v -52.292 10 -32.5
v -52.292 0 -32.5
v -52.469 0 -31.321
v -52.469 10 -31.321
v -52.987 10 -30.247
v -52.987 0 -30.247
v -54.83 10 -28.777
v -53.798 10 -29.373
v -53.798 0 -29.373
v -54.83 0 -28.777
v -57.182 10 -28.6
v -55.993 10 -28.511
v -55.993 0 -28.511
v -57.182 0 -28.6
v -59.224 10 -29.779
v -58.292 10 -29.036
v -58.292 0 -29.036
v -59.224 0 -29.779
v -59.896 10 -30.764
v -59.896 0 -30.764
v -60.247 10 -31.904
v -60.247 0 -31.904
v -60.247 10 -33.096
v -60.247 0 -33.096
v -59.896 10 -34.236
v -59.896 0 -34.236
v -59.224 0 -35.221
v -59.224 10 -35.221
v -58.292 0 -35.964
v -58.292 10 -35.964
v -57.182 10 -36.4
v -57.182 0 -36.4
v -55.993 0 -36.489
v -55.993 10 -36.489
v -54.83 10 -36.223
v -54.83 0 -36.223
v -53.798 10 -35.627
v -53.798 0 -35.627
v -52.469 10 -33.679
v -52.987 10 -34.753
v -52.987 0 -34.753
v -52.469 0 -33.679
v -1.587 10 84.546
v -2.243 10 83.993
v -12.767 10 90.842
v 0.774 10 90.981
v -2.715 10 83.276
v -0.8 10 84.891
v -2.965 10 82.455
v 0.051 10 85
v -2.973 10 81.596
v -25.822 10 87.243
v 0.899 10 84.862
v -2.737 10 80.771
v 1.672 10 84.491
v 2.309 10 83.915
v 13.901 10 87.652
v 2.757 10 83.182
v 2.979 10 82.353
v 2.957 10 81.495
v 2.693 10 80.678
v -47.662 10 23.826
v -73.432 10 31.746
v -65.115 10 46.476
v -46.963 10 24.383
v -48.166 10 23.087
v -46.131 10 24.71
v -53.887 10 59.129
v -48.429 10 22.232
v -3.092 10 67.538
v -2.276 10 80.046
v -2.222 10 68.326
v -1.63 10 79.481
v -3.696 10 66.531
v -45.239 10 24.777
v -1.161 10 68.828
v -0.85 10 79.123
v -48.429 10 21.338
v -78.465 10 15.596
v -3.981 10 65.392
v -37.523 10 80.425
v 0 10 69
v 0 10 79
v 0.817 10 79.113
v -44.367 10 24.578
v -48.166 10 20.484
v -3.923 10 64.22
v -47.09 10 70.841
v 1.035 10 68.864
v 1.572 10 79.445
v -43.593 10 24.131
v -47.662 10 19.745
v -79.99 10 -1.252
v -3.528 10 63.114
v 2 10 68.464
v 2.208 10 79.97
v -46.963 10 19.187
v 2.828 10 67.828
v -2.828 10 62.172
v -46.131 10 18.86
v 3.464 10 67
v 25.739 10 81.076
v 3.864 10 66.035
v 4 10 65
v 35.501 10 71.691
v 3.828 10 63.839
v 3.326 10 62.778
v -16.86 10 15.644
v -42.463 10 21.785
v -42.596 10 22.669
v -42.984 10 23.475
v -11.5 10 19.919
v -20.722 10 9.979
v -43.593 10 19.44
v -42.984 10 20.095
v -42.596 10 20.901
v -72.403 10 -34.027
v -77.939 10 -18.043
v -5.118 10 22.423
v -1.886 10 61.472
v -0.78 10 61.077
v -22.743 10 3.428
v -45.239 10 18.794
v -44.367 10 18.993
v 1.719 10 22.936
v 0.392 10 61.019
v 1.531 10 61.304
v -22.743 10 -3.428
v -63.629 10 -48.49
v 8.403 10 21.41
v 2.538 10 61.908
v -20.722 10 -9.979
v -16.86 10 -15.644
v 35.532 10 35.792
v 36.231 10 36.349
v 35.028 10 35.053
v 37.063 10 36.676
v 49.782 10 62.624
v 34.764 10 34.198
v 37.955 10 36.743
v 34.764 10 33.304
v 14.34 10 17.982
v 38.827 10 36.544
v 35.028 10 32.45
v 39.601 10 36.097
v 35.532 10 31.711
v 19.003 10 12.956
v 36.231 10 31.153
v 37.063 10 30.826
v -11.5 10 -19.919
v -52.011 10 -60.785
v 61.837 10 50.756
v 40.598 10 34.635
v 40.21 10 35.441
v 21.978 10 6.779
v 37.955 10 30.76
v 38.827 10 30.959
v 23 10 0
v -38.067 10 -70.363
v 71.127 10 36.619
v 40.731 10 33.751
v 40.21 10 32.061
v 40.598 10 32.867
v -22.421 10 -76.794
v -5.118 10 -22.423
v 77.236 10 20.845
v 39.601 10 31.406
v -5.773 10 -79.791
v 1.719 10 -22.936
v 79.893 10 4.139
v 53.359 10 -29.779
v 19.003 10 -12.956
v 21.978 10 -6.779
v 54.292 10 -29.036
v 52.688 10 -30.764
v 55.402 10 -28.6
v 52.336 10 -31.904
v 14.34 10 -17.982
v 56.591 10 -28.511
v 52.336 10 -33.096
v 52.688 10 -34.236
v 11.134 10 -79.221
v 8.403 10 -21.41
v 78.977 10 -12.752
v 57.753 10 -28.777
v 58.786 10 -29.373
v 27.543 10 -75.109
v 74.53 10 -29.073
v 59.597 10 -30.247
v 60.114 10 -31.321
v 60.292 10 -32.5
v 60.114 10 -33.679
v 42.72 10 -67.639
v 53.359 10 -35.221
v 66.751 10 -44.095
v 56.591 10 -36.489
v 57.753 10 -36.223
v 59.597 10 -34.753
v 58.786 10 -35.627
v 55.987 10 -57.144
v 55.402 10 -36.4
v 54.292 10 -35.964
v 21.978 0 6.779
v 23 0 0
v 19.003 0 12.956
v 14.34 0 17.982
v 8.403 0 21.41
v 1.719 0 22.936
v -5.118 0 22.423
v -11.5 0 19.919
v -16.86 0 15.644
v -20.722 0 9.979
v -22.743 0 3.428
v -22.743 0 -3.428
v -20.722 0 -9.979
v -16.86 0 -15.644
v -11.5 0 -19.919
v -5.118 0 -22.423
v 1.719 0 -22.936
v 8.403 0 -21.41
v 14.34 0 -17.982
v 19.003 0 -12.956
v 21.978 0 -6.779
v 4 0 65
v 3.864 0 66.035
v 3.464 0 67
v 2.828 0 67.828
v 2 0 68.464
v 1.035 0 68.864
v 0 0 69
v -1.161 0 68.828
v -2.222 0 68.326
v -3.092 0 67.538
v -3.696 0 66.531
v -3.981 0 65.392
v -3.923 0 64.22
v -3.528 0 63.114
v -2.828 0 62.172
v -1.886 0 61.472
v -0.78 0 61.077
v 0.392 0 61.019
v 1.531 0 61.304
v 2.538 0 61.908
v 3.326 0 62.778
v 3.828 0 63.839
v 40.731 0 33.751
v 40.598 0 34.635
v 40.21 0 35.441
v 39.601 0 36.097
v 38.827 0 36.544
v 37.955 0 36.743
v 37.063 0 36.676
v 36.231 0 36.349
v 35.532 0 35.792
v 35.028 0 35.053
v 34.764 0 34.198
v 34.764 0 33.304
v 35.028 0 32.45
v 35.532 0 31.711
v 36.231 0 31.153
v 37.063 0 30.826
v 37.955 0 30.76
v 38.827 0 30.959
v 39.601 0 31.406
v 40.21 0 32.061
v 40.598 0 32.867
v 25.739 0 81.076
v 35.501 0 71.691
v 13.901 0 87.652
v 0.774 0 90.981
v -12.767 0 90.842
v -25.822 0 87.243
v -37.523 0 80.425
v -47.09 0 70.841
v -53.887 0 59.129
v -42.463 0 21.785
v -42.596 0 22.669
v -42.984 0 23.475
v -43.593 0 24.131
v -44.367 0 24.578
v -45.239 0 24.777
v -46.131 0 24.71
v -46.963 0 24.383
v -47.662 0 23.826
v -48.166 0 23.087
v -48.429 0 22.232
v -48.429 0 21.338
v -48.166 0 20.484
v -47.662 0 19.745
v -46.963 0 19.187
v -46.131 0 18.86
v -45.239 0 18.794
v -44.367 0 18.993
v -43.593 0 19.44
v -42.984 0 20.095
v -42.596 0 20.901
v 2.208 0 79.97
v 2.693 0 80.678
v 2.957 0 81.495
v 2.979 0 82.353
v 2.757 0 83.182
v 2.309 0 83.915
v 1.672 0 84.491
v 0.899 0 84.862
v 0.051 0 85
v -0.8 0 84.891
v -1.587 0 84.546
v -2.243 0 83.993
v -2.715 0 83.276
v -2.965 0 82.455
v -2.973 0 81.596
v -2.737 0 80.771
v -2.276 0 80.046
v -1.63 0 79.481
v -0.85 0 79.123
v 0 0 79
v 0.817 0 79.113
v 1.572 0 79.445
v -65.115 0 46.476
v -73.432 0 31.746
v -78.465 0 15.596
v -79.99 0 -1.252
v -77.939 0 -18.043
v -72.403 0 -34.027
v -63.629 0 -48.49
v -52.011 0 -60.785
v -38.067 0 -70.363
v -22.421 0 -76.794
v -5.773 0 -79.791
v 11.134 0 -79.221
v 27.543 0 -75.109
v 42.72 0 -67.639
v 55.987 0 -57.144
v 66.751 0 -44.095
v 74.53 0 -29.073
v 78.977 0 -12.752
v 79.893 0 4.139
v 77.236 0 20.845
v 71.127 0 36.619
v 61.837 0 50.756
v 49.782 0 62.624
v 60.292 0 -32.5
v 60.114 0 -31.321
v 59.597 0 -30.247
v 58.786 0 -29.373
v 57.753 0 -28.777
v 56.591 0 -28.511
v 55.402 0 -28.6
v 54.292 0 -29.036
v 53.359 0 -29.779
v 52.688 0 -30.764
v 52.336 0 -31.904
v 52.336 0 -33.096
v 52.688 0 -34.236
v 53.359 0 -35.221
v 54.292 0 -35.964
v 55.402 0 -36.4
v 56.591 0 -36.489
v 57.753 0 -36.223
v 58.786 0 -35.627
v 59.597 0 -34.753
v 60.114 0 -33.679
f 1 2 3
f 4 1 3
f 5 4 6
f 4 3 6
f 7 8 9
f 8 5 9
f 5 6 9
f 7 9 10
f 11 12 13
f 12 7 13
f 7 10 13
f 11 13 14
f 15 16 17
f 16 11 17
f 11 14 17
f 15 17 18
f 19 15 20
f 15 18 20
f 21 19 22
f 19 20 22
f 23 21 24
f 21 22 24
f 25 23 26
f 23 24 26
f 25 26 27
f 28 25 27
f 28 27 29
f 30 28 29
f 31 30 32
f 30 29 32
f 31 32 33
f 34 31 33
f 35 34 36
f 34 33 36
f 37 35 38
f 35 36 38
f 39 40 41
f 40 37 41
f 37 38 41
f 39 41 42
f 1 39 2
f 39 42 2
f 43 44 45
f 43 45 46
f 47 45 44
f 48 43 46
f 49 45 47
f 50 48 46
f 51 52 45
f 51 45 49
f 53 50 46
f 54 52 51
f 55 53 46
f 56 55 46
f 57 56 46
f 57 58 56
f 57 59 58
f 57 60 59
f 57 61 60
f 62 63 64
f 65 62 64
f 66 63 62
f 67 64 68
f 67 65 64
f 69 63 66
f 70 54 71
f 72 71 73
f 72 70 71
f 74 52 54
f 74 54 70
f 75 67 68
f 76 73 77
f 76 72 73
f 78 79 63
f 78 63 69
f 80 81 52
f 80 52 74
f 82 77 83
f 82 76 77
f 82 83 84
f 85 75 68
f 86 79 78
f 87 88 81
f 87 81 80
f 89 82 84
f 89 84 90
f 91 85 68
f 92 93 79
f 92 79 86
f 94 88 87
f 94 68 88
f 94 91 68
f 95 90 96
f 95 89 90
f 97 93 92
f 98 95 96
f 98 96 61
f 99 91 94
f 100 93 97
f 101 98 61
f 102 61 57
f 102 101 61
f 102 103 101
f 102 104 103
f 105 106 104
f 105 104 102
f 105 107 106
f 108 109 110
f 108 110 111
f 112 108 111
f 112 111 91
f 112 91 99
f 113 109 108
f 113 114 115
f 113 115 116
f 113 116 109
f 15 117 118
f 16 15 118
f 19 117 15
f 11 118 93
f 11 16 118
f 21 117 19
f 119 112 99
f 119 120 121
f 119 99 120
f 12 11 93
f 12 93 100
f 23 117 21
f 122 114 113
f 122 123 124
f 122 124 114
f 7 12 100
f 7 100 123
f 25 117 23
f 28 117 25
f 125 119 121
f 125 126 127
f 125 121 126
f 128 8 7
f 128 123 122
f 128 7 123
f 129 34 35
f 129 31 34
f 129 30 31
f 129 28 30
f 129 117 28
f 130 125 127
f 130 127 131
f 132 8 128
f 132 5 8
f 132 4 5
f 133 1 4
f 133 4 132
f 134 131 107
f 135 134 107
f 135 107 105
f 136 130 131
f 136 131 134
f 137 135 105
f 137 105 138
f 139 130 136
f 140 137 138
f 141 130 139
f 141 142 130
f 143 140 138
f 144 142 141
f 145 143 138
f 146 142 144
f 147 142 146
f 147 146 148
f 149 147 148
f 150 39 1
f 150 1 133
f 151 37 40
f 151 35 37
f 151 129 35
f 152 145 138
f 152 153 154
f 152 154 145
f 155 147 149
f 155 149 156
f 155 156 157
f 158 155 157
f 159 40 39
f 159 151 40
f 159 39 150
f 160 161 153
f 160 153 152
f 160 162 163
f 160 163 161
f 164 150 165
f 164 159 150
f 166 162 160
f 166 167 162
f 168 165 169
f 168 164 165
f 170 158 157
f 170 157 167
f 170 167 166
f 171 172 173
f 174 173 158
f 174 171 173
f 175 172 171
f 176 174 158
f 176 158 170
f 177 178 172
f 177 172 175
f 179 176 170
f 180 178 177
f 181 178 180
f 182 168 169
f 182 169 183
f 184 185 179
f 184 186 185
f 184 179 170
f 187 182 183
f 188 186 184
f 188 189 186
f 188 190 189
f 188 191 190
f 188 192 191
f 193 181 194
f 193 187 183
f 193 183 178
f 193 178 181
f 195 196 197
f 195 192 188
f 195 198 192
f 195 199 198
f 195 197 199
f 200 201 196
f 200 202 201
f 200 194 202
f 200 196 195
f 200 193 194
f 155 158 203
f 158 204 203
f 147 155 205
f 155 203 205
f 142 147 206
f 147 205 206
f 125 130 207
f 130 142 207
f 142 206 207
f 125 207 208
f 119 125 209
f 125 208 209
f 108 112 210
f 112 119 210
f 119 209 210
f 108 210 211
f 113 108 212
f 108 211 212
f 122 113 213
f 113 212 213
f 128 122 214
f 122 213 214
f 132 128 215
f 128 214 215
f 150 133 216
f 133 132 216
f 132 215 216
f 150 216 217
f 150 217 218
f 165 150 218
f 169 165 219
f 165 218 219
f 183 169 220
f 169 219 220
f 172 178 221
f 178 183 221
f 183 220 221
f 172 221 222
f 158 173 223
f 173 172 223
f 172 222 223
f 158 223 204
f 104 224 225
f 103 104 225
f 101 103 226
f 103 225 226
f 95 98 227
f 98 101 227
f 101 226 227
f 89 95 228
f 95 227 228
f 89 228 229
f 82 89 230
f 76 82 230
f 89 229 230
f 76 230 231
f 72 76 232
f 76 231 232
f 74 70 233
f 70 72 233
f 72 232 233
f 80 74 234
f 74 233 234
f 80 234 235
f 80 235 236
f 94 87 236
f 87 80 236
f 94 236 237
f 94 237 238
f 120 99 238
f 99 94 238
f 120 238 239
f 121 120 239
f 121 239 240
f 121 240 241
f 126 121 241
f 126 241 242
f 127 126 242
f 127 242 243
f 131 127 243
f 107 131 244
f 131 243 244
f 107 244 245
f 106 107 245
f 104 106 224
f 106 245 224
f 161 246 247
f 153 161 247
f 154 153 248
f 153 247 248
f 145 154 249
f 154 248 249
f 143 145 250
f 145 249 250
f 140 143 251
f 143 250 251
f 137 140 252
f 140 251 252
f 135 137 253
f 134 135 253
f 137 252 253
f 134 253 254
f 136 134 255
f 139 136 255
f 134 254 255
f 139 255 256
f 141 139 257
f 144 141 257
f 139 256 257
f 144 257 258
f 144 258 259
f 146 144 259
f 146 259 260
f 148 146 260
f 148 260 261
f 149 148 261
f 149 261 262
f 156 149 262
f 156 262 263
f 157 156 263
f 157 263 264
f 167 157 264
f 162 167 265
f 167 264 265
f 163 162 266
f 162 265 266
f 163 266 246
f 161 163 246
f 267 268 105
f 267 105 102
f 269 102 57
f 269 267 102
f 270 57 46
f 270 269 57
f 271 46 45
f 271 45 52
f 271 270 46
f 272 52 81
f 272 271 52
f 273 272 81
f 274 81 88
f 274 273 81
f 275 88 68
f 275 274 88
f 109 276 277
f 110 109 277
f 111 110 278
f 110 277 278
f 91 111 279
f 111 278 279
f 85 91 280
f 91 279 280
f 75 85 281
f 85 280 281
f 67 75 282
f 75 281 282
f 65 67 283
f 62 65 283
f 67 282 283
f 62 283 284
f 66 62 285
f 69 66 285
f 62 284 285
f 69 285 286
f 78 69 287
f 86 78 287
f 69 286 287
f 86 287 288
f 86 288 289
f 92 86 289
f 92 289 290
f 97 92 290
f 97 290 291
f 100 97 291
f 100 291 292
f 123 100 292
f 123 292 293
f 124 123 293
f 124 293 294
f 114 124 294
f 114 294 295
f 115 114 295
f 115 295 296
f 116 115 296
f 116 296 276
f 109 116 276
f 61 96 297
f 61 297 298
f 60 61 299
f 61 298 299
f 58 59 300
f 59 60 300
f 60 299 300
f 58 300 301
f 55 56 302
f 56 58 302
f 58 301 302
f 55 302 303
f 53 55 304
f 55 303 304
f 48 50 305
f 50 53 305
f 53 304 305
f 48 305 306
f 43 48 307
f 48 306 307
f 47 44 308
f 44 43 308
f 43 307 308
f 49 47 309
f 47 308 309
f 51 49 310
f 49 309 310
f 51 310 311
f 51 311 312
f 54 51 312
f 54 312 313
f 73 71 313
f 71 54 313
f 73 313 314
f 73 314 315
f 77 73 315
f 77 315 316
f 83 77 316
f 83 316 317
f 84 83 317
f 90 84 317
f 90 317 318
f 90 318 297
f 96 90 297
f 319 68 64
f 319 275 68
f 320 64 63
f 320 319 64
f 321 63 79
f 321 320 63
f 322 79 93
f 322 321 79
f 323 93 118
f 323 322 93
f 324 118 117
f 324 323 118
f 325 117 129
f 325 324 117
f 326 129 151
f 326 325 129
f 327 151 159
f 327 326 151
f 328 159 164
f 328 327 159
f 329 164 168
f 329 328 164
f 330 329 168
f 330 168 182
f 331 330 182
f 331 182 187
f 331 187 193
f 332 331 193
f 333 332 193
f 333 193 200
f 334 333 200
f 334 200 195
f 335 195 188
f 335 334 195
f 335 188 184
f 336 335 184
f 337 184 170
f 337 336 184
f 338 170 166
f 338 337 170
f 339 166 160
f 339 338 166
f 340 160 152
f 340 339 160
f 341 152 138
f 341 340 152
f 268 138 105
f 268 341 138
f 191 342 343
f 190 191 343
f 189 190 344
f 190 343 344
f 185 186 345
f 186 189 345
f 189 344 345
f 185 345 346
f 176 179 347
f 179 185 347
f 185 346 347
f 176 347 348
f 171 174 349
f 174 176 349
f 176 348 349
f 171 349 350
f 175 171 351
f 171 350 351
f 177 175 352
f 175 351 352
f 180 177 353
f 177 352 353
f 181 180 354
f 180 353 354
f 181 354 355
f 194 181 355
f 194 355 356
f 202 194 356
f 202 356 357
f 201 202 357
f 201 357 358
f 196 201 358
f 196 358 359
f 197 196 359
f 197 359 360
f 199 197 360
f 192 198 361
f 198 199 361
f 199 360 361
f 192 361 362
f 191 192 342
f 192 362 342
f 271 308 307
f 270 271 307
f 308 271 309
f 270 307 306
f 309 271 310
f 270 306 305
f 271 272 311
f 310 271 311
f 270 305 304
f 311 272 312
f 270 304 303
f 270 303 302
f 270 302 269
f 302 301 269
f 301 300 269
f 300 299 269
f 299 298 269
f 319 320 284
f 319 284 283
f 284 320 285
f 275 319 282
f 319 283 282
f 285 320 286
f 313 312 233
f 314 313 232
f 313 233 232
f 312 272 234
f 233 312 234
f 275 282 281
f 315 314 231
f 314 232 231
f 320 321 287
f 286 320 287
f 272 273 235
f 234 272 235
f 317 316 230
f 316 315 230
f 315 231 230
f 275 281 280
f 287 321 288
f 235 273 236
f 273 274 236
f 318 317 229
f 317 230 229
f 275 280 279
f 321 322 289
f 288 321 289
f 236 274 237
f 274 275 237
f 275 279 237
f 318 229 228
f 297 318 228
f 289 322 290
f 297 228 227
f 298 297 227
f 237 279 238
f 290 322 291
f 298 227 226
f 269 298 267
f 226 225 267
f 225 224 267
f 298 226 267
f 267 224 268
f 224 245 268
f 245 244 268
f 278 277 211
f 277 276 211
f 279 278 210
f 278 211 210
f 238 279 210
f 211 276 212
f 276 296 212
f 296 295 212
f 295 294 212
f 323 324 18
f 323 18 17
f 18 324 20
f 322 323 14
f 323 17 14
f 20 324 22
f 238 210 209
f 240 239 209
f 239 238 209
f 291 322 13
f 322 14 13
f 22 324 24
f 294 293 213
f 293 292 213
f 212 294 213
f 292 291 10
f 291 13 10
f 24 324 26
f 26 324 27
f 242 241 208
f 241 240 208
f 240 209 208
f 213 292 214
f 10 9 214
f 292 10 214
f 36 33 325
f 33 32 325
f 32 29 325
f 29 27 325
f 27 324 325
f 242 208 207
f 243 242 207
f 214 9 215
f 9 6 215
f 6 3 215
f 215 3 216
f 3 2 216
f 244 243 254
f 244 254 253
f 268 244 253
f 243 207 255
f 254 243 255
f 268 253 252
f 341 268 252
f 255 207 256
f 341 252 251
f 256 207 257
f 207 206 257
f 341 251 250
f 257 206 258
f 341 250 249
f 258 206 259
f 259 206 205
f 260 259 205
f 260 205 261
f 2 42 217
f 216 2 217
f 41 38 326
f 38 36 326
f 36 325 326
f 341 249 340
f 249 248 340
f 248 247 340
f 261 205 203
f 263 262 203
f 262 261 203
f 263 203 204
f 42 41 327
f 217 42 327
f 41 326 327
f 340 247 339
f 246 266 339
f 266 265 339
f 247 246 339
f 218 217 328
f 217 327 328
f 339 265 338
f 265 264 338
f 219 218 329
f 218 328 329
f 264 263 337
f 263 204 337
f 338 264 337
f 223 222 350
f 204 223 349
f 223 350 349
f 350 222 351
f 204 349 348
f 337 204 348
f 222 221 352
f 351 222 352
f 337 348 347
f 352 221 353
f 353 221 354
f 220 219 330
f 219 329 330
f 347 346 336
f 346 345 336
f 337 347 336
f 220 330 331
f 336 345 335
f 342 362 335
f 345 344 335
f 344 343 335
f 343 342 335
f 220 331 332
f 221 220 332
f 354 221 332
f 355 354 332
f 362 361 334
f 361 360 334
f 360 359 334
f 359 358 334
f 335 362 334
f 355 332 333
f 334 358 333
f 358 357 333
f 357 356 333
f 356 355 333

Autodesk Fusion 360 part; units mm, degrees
sketch "Sketch2" plane through (0, 0, 0) normal (0, 1, 0) x (1, 0, 0)
  circle A0 centre (0, 0) radius 80
  circle A1 centre (0, -65) radius 4
  circle A2 centre (-56.2917, 32.5) radius 4
  circle A3 centre (56.2917, 32.5) radius 4
  circle A4 centre (0, 0) radius 23
  dimension "d29" = 160
  dimension "d30" = 8
  dimension "d31" = 8
  dimension "d32" = 8
  dimension "d33" = 120
  dimension "d34" = 120
  dimension "d35" = 65
  dimension "d36" = 65
  dimension "d37" = 65
  dimension "d38" = 46
sketch "Sketch3" plane through (0, 0, 0) normal (0, 1, 0) x (1, 0, 0)
  circle A0 centre (0, -82) radius 3
  circle A1 centre (0, -65) radius 4
  circle A2 centre (37.7308, -33.7512) radius 3
  circle A3 centre (-45.463, -21.7852) radius 3
  circle A4 centre (-5.4604, -38.8527) radius 43.4915 construction
  line L0 (0, 0) -> (0, -106.7199)
  line L1 (0, 0) -> (-5.4604, -38.8527) construction
  circle A5 centre (-5.4604, -38.8527) radius 52.5
  line L2 (-44.0663, -23.3245) -> (-50.9, -23.3245)
  line L3 (-47.433, -26.5975) -> (-47.433, -19.6919)
  line L4 (32.8029, -32.5277) -> (40.5, -32.5277)
  line L5 (36.1117, -35.7471) -> (36.1117, -28.3628)
  point P0 (-47.433, -23.3245)
  point P1 (36.1117, -32.5277)
  dimension "d40" = 6
  dimension "d41" = 17
  dimension "d42" = 6
  dimension "d43" = 61.25
  dimension "d44" = 6
  dimension "d45" = 84.05
  dimension "d46" = 75.45
  dimension "d47" = 8
  dimension "d48" = 105
extrude "Extrude1" add sketch "Sketch3" sketch "Sketch2" along normal blind 10 of sketch 2
extrude "Extrude2" cut sketch "Sketch3" along normal blind 10 contours A0 L0 | A0 L0
extrude "Extrude3" cut sketch "Sketch2" along normal blind 10 contours A4
extrude "Extrude4" cut sketch "Sketch3" along normal blind 10 contours A3 L2 L3 | A3 L2 L3
extrude "Extrude5" cut sketch "Sketch3" along normal blind 10 contours A2 L4 | A2 L4 L5 | A2 L4 L5
sketch "Sketch4" plane through (0, 0, 0) normal (0, -1, 0) x (1, 0, 0)
  circle A0 centre (37.7308, 33.7512) radius 3
  circle A1 centre (-45.463, 21.7852) radius 3
  circle A2 centre (0, 65) radius 4
  circle A3 centre (0, 0) radius 23
  circle A4 centre (56.2917, -32.5) radius 4
  circle A5 centre (-56.2917, -32.5) radius 4
  arc A6 (35.5015, 71.6913) -> (-53.887, 59.1286) centre (-5.4604, 38.8527) ccw
  arc A7 (-53.887, 59.1286) -> (35.5015, 71.6913) centre (0, 0) ccw
  circle A8 centre (0, 82) radius 3
  circle A9 centre (0, 0) radius 23
  circle A10 centre (37.7308, 33.7512) radius 3
  circle A11 centre (0, 65) radius 4
  circle A12 centre (0, 82) radius 3
  circle A13 centre (-45.463, 21.7852) radius 3
  circle A14 centre (-56.2917, -32.5) radius 4
  circle A15 centre (56.2917, -32.5) radius 4
  line L0 (0, 83.5) -> (0, 80)
  line L1 (-1.6, 82) -> (1.6, 82)
  line L2 (0, 67.3) -> (0, 62.5)
  line L3 (-3, 65) -> (3.4, 65)
  line L4 (35.496, 33.7512) -> (39.8, 33.7512)
  line L5 (37.7308, 36.0039) -> (37.7308, 31.5)
  line L6 (-45.463, 24.0048) -> (-45.463, 19.2402)
  line L7 (-47.6513, 21.7852) -> (-43.1669, 21.7852)
  line L8 (-56.2917, -29.4965) -> (-56.2917, -35.5)
  line L9 (-59, -32.5) -> (-53.5, -32.5)
  line L10 (56.2917, -29.0015) -> (56.2917, -36)
  line L11 (53.1873, -32.5) -> (59.5, -32.5)
  line L12 (0, 10) -> (0, -9.5078)
  line L13 (-10, 0) -> (10, 0)
  dimension "d59" = 46
  dimension "d60" = 6
  dimension "d61" = 8
  dimension "d62" = 6
  dimension "d63" = 6
  dimension "d64" = 8
  dimension "d65" = 8
